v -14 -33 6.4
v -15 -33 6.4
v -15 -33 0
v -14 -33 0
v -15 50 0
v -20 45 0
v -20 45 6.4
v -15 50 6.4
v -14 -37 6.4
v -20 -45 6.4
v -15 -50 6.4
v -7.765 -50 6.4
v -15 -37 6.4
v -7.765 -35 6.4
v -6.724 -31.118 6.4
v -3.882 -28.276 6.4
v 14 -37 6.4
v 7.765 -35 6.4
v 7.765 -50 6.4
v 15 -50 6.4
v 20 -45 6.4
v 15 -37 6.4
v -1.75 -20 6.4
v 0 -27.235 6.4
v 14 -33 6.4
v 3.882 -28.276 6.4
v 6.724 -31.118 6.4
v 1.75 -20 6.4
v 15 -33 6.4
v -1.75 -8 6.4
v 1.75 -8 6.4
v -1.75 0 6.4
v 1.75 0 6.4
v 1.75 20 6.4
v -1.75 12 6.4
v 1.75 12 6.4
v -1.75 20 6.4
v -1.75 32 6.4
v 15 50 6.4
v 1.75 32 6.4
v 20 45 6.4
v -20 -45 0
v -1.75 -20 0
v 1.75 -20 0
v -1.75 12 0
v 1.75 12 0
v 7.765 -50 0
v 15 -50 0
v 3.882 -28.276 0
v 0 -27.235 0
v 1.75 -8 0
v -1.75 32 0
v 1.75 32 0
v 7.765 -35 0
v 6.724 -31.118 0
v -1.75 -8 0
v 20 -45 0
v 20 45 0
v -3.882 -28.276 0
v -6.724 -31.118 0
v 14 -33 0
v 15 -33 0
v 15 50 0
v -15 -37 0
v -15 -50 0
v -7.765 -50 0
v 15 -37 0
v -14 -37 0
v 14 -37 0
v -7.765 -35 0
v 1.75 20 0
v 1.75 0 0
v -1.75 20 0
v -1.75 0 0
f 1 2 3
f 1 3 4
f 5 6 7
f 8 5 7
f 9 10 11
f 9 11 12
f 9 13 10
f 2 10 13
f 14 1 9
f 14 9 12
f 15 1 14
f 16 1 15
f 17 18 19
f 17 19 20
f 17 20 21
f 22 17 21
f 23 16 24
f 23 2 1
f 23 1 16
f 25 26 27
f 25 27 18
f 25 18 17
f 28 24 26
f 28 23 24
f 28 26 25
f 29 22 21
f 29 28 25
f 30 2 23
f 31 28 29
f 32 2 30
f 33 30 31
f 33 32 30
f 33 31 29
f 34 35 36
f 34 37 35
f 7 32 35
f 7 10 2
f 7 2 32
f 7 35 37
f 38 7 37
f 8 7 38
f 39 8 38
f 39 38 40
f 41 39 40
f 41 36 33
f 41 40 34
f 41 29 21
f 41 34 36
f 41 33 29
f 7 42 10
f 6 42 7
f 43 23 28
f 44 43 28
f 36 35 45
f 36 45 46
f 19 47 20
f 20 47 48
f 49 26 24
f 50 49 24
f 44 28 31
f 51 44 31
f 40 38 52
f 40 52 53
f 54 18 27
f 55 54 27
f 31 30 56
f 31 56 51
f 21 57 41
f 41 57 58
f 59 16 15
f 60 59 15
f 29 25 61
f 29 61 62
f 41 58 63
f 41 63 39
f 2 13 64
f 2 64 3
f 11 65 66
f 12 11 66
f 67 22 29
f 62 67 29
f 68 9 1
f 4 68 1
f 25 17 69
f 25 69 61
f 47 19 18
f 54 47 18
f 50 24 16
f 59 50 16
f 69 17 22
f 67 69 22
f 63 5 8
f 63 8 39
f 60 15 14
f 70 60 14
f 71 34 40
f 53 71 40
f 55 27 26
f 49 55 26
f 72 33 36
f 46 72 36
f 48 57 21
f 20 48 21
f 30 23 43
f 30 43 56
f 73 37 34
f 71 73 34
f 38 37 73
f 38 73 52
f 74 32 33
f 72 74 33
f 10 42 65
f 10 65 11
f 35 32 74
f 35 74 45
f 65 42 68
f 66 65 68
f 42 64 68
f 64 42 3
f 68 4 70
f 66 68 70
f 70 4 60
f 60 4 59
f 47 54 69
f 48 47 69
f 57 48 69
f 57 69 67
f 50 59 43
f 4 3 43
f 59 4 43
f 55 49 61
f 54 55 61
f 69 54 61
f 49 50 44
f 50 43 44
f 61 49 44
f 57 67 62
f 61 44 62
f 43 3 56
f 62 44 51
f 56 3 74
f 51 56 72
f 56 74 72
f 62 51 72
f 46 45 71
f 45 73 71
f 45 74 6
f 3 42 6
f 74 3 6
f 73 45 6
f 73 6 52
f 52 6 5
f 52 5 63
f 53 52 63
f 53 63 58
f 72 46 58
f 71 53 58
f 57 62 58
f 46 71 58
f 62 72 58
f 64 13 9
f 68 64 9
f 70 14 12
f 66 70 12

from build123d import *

# Parameters (mm, degrees)
F0_W     = 40
F0_H     = 100
F1_DEPTH = 6.4
F2_SIZE  = 5
F4_DEPTH = 6.401
F5_W     = 1
F5_H     = 4
F6_DEPTH = 6.401
F7_W     = 3.5
F7_H     = 12
F8_DEPTH = 6.401


with BuildPart() as f1:
    # F0 (on Top) → F1 (new body)
    with BuildSketch(Plane.XY):
        Rectangle(F0_W, F0_H)
    extrude(amount=F1_DEPTH)

    # F2
    f2_edges = [f1.edges().sort_by_distance(p)[0] for p in [
        (-20, -50, 3.2),
        (20, -50, 3.2),
        (20, 50, 3.2),
        (-20, 50, 3.2),
    ]]
    chamfer(f2_edges, length=F2_SIZE)

    # F3 (on face) → F4 (cut, through all)
    with BuildSketch(Plane.XY.offset(6.4)):
        Polygon((3.882286, -41.724316), (6.724316, -38.882286), (7.764571, -35), (6.724316, -31.117714), (3.882286, -28.275684), (0, -27.235429), (-3.882286, -28.275684), (-6.724316, -31.117714), (-7.764571, -35), (-6.724316, -38.882286), (-3.882286, -41.724316), (0, -42.764571), align=None)
        Polygon((7.764571, -35), (6.724316, -38.882286), (3.882286, -41.724316), (0, -42.764571), (-3.882286, -41.724316), (-6.724316, -38.882286), (-7.764571, -35), (-7.764571, -50), (7.764571, -50), align=None)
    extrude(amount=-F4_DEPTH, mode=Mode.SUBTRACT)

    # F5 (on face) → F6 (cut, through all)
    with BuildSketch(Plane.XY.offset(6.4)):
        with Locations((14.5, -35)):
            Rectangle(F5_W, F5_H)
        with Locations((-14.5, -35)):
            Rectangle(F5_W, F5_H)
    extrude(amount=-F6_DEPTH, mode=Mode.SUBTRACT)

    # F7 (on face) → F8 (cut, through all)
    with BuildSketch(Plane.XY.offset(6.4)):
        with Locations((0, 6)):
            Rectangle(F7_W, F7_H)
        with Locations((0, -14)):
            Rectangle(F7_W, F7_H)
        with Locations((0, 26)):
            Rectangle(F7_W, F7_H)
    extrude(amount=-F8_DEPTH, mode=Mode.SUBTRACT)


solid = f1.part
